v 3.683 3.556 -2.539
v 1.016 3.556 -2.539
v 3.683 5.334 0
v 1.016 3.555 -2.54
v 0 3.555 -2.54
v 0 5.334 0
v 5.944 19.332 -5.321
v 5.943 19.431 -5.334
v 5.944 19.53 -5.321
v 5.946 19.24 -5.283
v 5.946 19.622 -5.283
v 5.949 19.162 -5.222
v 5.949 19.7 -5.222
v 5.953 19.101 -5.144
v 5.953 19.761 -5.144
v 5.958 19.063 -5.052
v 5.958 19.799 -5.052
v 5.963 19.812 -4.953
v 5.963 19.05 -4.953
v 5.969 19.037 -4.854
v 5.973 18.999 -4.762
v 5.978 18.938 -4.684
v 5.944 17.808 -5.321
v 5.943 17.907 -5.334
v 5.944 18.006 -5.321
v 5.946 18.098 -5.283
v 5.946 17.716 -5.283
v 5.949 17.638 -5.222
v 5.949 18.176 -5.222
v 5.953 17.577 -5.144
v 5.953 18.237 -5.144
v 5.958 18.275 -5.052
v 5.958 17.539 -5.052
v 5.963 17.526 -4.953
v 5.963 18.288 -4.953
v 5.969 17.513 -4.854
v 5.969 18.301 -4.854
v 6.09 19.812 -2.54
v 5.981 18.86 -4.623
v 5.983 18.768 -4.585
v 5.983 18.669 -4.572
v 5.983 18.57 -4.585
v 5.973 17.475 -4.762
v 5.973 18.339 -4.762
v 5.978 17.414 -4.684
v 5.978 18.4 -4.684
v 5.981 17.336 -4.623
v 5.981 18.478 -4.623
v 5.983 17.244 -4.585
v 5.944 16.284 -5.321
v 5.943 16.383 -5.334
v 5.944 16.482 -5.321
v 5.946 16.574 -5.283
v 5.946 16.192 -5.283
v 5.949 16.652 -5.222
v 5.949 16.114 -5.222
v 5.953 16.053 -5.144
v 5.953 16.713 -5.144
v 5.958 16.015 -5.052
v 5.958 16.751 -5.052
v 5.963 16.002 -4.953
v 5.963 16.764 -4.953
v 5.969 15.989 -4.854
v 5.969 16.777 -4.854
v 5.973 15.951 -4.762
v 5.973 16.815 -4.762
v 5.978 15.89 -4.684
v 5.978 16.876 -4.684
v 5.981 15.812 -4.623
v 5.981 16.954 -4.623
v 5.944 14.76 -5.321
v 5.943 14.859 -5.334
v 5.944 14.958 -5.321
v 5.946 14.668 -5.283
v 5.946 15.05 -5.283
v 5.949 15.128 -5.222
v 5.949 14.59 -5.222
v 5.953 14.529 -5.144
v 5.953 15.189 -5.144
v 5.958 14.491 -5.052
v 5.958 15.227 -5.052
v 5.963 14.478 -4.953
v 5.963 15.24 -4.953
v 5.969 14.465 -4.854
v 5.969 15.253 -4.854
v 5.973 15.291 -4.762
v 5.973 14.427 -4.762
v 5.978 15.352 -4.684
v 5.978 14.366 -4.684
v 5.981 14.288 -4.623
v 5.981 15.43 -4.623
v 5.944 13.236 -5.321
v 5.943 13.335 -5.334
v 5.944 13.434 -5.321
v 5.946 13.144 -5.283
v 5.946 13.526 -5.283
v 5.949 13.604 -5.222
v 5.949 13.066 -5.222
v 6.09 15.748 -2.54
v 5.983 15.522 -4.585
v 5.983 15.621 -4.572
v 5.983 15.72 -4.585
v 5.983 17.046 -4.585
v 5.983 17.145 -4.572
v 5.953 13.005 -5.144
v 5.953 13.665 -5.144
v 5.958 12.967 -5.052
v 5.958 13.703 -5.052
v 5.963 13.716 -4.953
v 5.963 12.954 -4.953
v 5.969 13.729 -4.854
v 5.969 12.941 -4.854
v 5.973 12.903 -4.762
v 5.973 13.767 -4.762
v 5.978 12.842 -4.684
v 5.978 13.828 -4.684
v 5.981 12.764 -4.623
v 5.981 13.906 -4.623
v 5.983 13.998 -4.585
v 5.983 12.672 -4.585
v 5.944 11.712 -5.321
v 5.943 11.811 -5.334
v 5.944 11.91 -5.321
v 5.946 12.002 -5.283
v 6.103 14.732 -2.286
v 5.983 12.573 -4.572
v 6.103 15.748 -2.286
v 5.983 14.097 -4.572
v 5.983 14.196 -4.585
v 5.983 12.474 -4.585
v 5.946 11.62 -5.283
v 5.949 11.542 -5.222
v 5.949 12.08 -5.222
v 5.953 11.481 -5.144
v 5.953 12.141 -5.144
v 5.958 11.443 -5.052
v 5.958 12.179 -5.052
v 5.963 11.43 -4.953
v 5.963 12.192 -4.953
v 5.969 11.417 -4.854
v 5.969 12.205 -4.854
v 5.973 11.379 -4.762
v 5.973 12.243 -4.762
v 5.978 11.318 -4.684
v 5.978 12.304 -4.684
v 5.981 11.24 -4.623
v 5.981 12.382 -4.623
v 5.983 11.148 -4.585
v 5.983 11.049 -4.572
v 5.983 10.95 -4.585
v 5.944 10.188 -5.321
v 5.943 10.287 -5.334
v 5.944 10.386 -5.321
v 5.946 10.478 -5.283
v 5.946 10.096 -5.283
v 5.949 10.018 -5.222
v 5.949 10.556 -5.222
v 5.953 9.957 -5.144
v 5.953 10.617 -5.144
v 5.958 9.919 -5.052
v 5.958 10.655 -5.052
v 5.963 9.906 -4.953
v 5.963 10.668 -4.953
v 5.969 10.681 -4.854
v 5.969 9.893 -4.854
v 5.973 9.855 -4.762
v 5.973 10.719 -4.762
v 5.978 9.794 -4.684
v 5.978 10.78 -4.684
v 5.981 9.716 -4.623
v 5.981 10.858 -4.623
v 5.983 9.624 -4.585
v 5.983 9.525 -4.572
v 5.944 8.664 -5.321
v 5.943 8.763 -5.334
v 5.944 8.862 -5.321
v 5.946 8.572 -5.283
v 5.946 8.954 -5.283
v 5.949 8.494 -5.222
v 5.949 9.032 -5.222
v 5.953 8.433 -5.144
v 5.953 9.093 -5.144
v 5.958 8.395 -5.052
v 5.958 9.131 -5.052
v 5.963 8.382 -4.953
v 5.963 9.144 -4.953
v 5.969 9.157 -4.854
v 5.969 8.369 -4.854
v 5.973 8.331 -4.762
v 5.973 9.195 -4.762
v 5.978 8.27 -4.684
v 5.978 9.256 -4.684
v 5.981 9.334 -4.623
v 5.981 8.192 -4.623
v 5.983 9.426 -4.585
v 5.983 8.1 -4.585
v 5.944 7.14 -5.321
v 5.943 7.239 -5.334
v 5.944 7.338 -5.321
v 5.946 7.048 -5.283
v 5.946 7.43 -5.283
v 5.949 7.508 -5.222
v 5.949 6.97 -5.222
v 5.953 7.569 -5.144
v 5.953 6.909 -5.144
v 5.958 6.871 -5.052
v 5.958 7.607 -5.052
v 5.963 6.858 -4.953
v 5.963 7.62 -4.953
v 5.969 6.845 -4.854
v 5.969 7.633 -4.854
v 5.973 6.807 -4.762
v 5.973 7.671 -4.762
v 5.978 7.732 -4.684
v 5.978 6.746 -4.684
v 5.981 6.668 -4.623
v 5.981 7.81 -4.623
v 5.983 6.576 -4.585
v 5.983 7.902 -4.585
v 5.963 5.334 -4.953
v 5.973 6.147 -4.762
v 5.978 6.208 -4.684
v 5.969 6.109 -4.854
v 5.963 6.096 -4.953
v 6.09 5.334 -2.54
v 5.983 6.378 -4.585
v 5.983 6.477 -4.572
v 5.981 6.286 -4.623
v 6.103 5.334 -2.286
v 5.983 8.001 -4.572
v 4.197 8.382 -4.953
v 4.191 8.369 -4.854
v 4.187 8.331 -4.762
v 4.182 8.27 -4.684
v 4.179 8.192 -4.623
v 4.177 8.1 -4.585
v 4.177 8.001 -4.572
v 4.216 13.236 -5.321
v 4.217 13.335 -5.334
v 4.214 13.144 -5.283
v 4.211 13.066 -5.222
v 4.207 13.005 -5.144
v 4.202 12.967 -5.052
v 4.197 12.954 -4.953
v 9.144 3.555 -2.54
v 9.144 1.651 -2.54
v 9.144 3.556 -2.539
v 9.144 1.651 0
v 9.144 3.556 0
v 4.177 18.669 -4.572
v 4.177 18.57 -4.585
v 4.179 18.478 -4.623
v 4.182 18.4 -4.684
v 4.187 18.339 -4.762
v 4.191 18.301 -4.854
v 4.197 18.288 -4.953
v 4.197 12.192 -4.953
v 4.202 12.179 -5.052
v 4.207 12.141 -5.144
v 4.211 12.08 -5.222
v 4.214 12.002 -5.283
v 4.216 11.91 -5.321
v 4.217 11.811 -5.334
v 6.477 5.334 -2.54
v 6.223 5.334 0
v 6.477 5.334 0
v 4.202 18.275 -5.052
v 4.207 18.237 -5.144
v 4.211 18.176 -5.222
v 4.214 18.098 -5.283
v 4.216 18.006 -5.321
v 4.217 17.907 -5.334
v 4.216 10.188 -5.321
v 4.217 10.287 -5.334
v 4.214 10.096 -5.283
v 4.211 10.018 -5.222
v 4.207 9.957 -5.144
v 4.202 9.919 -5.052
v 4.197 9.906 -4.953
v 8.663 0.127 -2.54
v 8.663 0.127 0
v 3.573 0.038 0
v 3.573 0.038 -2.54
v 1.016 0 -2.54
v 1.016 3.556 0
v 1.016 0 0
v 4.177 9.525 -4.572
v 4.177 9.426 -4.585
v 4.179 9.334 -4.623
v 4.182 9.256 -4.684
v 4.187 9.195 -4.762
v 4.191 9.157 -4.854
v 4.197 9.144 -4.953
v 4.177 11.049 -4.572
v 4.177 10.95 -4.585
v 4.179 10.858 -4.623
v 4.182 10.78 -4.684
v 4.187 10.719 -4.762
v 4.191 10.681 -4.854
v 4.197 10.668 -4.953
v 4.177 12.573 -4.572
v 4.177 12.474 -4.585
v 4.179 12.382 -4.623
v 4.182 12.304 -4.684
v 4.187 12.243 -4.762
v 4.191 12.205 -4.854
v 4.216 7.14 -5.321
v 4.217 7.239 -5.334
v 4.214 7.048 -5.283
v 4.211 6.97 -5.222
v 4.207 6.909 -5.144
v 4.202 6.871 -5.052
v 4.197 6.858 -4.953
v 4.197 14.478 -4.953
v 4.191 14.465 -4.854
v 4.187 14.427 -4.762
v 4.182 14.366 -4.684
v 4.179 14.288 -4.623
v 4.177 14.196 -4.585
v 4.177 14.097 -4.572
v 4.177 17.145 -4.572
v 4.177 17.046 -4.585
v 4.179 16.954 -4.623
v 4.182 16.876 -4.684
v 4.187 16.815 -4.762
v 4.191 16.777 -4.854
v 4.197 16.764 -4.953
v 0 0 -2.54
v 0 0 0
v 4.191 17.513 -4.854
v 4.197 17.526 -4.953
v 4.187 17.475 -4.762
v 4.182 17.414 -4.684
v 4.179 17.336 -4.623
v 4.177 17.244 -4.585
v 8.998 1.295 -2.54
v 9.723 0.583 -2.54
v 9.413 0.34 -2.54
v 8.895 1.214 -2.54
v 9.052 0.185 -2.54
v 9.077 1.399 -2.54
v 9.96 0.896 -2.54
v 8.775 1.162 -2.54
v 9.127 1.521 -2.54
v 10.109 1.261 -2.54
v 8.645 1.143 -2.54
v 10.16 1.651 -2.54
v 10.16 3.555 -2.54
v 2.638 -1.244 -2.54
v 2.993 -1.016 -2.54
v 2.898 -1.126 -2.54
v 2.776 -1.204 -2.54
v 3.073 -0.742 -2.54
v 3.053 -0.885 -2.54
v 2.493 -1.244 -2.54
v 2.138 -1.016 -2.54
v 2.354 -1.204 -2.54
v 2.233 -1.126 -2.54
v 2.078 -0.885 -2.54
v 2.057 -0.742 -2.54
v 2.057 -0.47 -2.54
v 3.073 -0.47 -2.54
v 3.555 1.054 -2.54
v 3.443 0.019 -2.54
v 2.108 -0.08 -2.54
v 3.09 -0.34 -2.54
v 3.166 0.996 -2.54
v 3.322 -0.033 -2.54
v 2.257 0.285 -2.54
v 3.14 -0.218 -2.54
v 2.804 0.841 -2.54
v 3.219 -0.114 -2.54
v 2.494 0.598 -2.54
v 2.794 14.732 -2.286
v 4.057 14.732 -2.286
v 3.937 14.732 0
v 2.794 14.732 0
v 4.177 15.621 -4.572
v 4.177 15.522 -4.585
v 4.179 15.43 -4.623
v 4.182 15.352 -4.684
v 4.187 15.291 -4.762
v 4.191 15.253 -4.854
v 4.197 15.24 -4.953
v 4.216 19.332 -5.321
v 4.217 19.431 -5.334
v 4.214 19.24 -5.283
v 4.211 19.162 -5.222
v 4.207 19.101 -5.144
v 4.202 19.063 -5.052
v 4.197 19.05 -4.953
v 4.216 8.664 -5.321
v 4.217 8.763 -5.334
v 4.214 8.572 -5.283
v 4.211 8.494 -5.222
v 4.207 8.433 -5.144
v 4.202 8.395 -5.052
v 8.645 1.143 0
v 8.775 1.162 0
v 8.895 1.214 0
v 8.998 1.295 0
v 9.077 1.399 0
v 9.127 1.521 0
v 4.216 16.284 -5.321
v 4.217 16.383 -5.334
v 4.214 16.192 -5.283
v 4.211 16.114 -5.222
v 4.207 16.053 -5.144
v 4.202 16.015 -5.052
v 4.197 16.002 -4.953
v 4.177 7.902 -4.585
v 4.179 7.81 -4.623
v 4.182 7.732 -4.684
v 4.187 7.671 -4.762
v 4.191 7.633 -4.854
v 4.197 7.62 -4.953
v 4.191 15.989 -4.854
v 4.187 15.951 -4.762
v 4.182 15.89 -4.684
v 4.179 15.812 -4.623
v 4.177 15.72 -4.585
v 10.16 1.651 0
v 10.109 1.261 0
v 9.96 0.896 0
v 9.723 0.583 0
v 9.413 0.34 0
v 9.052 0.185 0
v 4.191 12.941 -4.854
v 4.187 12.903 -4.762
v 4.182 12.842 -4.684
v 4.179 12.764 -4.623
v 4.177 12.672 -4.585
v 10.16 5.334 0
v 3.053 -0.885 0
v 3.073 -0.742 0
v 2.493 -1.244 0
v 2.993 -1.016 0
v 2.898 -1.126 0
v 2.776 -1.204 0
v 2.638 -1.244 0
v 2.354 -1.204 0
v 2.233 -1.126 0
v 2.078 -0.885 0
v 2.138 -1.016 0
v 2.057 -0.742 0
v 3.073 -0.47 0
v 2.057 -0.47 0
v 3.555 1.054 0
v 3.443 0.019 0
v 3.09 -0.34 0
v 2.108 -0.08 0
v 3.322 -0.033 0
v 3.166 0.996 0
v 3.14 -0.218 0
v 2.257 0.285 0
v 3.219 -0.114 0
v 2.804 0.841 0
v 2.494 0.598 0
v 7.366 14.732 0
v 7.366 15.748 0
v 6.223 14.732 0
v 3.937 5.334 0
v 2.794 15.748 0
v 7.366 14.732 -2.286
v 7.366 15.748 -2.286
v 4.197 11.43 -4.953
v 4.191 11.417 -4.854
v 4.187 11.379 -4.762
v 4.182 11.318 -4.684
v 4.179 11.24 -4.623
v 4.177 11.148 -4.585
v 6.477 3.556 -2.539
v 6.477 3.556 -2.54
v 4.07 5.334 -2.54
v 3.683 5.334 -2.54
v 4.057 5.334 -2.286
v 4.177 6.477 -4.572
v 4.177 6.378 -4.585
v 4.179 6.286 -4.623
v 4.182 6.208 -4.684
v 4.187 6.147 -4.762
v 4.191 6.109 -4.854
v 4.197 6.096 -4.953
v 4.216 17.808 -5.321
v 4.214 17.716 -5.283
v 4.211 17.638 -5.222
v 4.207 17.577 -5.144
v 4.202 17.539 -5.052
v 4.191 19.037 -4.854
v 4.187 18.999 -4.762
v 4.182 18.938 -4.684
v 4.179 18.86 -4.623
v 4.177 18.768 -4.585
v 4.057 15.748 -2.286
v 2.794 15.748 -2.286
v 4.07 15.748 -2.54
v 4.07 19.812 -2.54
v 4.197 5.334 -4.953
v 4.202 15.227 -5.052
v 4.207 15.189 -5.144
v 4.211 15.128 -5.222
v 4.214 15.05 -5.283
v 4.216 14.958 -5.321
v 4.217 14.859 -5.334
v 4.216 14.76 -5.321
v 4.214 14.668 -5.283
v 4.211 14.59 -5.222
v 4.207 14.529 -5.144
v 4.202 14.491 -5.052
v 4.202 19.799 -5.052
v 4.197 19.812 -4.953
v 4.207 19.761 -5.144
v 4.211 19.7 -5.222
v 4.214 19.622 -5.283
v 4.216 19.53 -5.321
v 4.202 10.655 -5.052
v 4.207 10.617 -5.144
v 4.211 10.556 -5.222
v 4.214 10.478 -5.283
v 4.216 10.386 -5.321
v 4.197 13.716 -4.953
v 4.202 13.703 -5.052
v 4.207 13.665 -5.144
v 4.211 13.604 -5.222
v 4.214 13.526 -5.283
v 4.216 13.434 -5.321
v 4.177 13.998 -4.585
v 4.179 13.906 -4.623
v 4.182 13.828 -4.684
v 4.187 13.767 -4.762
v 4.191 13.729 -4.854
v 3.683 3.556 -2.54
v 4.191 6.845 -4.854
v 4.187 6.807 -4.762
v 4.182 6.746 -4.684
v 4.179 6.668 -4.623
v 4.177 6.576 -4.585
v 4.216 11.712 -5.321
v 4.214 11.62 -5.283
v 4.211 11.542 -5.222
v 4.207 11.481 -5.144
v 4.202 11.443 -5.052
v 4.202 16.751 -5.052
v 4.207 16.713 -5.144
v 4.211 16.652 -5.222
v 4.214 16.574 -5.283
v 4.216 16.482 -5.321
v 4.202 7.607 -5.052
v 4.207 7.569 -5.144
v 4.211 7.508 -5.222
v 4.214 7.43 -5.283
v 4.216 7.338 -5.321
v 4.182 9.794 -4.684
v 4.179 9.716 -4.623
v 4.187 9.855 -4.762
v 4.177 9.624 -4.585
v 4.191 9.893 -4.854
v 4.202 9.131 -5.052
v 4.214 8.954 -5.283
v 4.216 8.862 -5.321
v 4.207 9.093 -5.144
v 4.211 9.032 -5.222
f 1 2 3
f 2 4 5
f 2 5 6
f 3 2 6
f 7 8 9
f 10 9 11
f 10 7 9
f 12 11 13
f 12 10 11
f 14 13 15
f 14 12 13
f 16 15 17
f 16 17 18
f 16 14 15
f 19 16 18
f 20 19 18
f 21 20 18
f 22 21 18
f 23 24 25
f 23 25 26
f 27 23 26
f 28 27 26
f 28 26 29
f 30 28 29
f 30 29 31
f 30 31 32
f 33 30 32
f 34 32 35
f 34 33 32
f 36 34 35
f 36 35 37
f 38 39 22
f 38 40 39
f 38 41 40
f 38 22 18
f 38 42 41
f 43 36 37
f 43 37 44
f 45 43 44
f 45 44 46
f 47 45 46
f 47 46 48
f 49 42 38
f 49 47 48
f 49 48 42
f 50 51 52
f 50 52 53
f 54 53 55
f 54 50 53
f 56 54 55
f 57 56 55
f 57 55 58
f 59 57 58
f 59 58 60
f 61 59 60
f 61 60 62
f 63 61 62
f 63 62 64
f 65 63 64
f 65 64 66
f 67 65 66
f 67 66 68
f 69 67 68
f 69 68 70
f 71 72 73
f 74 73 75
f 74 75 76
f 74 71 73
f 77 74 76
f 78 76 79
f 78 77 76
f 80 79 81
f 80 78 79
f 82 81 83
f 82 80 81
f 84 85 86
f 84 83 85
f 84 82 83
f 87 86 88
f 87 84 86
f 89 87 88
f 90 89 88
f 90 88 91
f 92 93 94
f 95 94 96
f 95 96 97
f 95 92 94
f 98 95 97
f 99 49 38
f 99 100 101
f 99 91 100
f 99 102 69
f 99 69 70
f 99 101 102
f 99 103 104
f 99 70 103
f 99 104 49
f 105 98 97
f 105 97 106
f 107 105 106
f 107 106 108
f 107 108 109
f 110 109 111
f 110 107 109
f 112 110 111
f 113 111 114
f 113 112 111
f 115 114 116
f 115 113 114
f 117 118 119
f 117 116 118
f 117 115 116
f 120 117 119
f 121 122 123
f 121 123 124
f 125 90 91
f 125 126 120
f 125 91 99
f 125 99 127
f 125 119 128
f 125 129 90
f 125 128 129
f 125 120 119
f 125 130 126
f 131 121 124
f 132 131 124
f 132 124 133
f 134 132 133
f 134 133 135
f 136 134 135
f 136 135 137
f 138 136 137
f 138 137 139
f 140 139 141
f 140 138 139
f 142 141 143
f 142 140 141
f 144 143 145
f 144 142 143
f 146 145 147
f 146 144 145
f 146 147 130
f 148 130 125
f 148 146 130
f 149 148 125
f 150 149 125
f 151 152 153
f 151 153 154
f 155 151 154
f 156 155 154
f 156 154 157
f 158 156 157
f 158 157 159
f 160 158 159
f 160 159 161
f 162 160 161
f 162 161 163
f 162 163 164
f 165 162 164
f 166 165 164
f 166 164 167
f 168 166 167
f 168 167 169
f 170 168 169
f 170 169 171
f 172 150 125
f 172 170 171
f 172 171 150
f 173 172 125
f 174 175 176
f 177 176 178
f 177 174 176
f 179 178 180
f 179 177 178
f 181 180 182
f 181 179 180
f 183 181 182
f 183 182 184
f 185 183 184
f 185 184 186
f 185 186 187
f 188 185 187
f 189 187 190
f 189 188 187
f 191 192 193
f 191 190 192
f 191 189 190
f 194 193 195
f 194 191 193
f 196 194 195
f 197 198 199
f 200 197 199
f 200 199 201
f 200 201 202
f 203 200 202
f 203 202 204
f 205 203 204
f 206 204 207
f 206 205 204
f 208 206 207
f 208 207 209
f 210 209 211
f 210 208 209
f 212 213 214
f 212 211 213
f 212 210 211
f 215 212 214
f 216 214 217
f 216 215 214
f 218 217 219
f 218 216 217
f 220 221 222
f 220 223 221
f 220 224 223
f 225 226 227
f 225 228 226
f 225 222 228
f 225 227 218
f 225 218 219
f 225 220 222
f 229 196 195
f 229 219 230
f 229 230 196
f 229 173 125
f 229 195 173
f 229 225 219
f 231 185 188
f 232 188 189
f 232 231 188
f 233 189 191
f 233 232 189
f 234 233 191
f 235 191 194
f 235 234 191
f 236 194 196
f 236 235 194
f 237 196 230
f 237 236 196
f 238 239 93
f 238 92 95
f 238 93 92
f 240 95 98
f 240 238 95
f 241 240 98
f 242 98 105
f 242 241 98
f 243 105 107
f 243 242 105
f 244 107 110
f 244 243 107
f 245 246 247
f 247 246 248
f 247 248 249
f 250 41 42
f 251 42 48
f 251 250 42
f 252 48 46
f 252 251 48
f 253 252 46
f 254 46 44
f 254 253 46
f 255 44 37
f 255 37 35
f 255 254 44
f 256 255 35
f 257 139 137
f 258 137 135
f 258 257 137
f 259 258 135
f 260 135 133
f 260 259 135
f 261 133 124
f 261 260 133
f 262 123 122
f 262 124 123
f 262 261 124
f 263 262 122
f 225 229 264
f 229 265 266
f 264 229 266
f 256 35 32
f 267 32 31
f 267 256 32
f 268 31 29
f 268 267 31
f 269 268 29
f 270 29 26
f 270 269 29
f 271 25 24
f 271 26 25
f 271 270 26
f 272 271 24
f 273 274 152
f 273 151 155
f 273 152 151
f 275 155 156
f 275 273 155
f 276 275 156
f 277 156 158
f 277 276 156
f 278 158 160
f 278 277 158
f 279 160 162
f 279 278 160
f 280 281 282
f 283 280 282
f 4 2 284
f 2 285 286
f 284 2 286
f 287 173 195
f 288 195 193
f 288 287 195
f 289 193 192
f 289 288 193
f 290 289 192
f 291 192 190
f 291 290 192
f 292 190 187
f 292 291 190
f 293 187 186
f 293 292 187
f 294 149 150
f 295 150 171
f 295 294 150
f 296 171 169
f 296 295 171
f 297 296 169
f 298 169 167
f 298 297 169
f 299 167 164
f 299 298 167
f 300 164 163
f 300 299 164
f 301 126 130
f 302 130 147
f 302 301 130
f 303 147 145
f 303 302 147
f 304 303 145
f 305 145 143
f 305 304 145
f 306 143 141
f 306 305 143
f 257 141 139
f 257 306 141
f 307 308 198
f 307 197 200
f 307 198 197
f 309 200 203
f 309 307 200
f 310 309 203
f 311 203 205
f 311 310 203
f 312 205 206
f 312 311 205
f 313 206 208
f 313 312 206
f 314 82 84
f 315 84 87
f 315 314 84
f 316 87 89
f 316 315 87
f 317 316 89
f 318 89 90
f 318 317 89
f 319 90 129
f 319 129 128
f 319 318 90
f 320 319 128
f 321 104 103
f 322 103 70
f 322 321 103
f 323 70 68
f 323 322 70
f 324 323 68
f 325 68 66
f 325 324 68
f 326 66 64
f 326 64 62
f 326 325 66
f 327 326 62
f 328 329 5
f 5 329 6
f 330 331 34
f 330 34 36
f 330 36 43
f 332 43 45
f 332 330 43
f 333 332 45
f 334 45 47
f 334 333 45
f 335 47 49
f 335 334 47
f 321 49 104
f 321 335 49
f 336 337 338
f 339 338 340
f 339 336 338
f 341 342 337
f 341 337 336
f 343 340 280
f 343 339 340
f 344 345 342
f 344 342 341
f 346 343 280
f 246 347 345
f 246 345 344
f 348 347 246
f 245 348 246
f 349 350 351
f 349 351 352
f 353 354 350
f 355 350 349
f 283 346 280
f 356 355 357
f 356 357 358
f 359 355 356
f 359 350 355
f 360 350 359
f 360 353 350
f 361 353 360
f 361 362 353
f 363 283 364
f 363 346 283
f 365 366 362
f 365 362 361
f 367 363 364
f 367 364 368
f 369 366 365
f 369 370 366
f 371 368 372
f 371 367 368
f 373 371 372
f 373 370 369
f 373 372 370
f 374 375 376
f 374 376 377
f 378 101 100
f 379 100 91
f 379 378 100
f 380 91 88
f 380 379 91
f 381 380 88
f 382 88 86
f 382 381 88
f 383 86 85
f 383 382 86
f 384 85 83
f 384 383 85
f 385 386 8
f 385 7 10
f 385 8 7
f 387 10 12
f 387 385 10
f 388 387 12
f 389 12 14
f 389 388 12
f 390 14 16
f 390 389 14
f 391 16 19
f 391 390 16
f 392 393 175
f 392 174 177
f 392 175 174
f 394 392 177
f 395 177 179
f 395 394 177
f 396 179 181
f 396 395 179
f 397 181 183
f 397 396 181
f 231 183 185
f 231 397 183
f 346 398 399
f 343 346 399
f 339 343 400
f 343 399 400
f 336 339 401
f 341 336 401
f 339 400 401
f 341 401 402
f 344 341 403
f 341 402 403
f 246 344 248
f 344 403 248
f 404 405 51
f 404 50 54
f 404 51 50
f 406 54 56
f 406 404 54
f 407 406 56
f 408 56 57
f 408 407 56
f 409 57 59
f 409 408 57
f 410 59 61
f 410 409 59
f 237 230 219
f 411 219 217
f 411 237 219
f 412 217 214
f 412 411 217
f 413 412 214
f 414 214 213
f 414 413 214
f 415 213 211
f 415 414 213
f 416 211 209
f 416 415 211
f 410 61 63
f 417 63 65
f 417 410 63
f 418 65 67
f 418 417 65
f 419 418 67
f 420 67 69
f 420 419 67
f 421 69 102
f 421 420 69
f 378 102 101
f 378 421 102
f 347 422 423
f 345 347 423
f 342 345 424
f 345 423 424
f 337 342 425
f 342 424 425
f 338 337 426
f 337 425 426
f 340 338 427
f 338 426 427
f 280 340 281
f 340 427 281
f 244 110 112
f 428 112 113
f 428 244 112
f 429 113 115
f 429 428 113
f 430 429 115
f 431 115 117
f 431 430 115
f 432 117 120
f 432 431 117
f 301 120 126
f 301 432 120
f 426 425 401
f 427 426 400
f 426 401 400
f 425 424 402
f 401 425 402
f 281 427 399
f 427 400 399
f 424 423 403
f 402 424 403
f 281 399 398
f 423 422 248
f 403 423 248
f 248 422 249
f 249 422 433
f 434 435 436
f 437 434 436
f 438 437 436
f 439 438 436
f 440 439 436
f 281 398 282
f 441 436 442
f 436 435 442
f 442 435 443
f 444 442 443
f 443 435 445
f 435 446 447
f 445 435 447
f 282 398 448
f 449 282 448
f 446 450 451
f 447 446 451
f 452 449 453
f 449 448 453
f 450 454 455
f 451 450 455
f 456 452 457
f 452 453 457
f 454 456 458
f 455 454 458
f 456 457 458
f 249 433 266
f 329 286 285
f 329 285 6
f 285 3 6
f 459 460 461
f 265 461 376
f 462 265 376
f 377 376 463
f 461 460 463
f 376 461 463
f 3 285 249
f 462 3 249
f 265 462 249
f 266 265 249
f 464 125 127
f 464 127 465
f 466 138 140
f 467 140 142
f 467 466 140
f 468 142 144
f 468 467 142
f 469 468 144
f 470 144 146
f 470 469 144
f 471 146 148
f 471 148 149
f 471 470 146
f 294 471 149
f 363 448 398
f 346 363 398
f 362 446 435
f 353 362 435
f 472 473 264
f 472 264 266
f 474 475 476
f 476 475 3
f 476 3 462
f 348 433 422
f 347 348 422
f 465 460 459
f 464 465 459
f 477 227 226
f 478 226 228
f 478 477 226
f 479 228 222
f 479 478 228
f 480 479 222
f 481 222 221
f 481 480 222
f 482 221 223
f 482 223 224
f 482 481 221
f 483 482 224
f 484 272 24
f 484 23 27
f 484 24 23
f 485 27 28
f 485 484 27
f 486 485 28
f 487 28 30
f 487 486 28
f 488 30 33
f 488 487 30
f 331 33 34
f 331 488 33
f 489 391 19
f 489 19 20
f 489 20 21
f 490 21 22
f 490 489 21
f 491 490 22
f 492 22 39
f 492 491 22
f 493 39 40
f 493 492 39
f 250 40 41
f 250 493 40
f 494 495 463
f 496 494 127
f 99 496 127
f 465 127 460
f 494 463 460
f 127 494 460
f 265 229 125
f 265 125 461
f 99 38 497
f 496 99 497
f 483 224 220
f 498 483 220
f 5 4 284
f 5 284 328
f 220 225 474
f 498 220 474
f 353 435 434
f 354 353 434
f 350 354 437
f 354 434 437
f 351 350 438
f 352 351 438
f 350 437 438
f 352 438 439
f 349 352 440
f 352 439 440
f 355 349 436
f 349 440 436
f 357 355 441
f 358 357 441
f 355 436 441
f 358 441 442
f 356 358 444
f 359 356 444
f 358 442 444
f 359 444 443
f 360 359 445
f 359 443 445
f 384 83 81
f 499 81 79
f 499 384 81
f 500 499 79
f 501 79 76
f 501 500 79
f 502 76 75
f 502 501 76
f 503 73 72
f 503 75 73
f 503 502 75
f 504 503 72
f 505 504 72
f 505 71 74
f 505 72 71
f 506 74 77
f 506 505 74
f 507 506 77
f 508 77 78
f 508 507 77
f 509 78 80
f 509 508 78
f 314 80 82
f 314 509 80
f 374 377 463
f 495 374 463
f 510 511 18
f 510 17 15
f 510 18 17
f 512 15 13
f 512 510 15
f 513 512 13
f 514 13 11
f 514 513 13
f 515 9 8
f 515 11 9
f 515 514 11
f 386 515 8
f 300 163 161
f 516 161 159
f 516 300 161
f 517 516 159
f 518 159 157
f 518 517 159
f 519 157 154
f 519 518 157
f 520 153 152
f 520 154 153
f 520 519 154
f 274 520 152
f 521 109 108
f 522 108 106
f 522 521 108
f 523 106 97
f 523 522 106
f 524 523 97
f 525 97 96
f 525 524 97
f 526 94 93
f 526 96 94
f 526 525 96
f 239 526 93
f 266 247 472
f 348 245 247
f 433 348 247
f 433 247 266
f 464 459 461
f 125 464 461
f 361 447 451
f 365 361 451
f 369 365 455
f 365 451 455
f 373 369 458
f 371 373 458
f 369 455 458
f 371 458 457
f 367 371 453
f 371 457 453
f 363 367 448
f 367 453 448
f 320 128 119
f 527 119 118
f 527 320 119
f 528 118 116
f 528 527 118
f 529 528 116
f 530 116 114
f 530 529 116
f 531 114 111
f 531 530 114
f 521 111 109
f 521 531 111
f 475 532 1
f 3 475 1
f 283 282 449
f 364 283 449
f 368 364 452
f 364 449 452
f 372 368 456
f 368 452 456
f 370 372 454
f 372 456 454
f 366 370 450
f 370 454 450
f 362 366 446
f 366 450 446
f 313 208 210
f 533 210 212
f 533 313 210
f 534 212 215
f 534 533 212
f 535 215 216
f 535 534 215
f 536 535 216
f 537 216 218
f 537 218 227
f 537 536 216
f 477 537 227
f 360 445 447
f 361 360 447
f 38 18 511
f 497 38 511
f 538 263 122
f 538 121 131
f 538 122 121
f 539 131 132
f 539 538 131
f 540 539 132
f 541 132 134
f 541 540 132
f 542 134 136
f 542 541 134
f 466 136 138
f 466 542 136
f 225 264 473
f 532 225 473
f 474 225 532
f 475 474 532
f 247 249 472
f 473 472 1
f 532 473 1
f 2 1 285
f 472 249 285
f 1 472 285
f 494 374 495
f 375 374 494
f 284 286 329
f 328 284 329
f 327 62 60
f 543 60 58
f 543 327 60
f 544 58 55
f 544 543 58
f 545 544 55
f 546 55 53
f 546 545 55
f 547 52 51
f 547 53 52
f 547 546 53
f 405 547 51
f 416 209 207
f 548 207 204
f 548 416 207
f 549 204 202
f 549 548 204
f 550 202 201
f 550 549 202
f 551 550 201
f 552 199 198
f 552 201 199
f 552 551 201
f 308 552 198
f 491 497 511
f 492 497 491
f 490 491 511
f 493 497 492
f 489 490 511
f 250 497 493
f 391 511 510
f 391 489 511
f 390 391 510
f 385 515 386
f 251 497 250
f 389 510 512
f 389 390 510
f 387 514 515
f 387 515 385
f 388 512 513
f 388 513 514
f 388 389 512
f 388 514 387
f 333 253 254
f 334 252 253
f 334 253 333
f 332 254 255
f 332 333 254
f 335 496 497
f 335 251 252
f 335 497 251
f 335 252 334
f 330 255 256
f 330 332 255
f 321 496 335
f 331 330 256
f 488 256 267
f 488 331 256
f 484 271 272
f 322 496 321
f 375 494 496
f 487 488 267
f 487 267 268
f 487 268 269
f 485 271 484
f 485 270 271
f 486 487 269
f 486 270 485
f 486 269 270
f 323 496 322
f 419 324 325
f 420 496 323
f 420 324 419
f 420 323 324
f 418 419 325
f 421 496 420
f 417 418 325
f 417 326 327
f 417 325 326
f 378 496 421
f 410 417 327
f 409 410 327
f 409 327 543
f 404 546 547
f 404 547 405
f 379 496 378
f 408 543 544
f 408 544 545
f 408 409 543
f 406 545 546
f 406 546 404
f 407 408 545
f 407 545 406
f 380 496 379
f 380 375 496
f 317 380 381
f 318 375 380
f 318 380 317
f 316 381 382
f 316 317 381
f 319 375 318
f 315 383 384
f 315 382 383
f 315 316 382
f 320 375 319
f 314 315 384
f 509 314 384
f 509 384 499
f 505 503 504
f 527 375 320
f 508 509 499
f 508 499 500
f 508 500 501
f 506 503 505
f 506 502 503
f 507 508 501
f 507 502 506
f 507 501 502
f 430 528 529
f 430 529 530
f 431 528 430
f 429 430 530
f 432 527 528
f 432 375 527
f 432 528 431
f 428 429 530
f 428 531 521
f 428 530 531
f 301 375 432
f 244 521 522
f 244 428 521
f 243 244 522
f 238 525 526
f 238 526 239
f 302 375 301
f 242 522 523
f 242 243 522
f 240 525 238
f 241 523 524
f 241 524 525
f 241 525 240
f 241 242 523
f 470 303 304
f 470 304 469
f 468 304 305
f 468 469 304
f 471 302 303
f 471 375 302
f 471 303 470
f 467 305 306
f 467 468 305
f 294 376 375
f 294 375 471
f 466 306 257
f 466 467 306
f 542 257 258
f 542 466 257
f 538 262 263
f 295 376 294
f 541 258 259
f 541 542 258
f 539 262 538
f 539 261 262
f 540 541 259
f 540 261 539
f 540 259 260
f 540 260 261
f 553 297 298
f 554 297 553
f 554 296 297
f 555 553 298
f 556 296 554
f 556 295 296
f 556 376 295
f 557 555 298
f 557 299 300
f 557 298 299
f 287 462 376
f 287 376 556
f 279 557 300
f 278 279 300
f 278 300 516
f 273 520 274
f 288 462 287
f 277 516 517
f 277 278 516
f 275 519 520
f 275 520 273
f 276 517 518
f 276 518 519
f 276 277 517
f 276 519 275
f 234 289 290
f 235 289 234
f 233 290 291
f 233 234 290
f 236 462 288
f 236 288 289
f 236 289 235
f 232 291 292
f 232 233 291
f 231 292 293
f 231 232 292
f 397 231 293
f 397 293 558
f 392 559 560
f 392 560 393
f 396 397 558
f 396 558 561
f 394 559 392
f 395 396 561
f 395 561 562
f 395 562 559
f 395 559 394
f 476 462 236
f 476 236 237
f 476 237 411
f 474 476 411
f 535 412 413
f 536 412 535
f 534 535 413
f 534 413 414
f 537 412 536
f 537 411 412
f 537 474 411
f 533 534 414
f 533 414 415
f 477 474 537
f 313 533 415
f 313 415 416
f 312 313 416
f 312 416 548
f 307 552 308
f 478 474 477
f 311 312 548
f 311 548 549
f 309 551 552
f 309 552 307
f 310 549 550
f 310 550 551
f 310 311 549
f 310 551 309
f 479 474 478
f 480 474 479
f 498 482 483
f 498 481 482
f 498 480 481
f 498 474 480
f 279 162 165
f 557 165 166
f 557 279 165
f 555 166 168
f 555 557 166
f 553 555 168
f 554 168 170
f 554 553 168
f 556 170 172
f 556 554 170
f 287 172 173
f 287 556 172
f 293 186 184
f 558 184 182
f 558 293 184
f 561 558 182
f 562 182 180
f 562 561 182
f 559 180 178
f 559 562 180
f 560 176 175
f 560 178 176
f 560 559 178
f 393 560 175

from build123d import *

# Parameters (mm, degrees)
BOSS_EXTRUDE1_DEPTH = 2.54
CUT_EXTRUDE2_DEPTH  = 3.683
CUT_EXTRUDE4_START  = 10.16
CUT_EXTRUDE4_DEPTH  = 3.683
SKETCH2_W           = 2.286
SKETCH2_H           = 14.478
BOSS_EXTRUDE2_DEPTH = 2.794
SKETCH3_W           = 1.143
SKETCH3_H           = 1.016
CUT_EXTRUDE5_DEPTH  = 0.254
DRAFT2_START        = 5.334
DRAFT2_DEPTH        = 14.478
DRAFT2_2_DEPTH      = 9.398
CUT_EXTRUDE6_DEPTH  = 23.895250599


# Read off the part's stored shape, not the designer's step: Draft2
with BuildPart() as part:
    # Model → Boss-Extrude1 (new body)
    with BuildSketch(Plane.XY):
        with BuildLine():
            Line((2.794, 15.748), (7.366, 15.748))
            Line((7.366, 15.748), (7.366, 14.732))
            Line((7.366, 14.732), (6.223, 14.732))
            Line((6.223, 14.732), (6.223, 5.334))
            Line((6.223, 5.334), (10.16, 5.334))
            Line((10.16, 5.334), (10.16, 1.650767887))
            ThreePointArc((10.16, 1.650767887), (9.722993685, 0.582582169), (8.662597467, 0.127))
            Line((8.662597467, 0.127), (3.572534178, 0.038152615))
            ThreePointArc((3.572534178, 0.038152615), (3.219068772, -0.113708108), (3.0734, -0.469770014))
            Line((3.0734, -0.469770014), (3.0734, -0.741620434))
            ThreePointArc((3.0734, -0.741620434), (2.5654, -1.249620434), (2.0574, -0.741620434))
            Line((2.0574, -0.741620434), (2.0574, -0.469770014))
            ThreePointArc((2.0574, -0.469770014), (2.494406315, 0.598415704), (3.554802533, 1.053997873))
            Line((3.554802533, 1.053997873), (8.644865822, 1.142845258))
            ThreePointArc((8.644865822, 1.142845258), (8.998331228, 1.294705981), (9.144, 1.650767887))
            Line((9.144, 1.650767887), (9.144, 3.556))
            Line((9.144, 3.556), (1.016, 3.556))
            Line((1.016, 3.556), (1.016, 0))
            Line((1.016, 0), (0, 0))
            Line((0, 0), (0, 5.334))
            Line((0, 5.334), (3.937, 5.334))
            Line((3.937, 5.334), (3.937, 14.732))
            Line((3.937, 14.732), (2.794, 14.732))
            Line((2.794, 14.732), (2.794, 15.748))
        make_face()
    extrude(amount=-BOSS_EXTRUDE1_DEPTH)

    # Sketch1 → Cut-Extrude2 (cut)
    with BuildSketch(Plane(origin=(0, 0, 0), x_dir=(0, 0, -1), z_dir=(1, 0, 0))):
        Polygon((0, 5.334), (2.54, 5.334), (2.54, 3.555472853), align=None)
    extrude(amount=CUT_EXTRUDE2_DEPTH, mode=Mode.SUBTRACT)

    # Sketch1<3> → Cut-Extrude4 (cut)
    with BuildSketch(Plane(origin=(0, 0, 0), x_dir=(0, 0, -1), z_dir=(1, 0, 0)).offset(CUT_EXTRUDE4_START)):
        Polygon((0, 5.334), (2.54, 5.334), (2.54, 3.555472853), align=None)
    extrude(amount=-CUT_EXTRUDE4_DEPTH, mode=Mode.SUBTRACT)

    # Sketch2 → Boss-Extrude2 (add)
    with BuildSketch(Plane(origin=(0, 0, -2.54), x_dir=(-1, 0, 0), z_dir=(0, 0, -1))):
        with Locations((-5.08, 12.573)):
            Rectangle(SKETCH2_W, SKETCH2_H)
    extrude(amount=BOSS_EXTRUDE2_DEPTH)

    # Sketch3 → Cut-Extrude5 (cut)
    with BuildSketch(Plane(origin=(0, 0, -2.54), x_dir=(-1, 0, 0), z_dir=(0, 0, -1))):
        with Locations((-6.7945, 15.24)):
            Rectangle(SKETCH3_W, SKETCH3_H)
        with Locations((-3.3655, 15.24)):
            Rectangle(SKETCH3_W, SKETCH3_H)
    extrude(amount=-CUT_EXTRUDE5_DEPTH, mode=Mode.SUBTRACT)

    # Draft2 outline → Draft2 (cut)
    with BuildSketch(Plane(origin=(0, 0, 0), x_dir=(1, 0, 0), z_dir=(0, 1, 0)).offset(DRAFT2_START)):
        Polygon((4.216543095, 5.334), (3.937, 5.334), (3.937, 2.286), (4.056804183, 2.286), align=None)
        Polygon((6.223, 5.334), (5.943456905, 5.334), (6.103195817, 2.286), (6.223, 2.286), align=None)
    extrude(amount=DRAFT2_DEPTH, mode=Mode.SUBTRACT)

    # Draft2 2 outline → Draft2 2 (cut)
    with BuildSketch(Plane(origin=(0, 0, 0), x_dir=(1, 0, 0), z_dir=(0, 1, 0)).offset(DRAFT2_START)):
        Polygon((3.937, 0), (4.056804184, 2.286), (3.937, 2.286), align=None)
        Polygon((6.223, 2.286), (6.103195817, 2.286), (6.223, 0), align=None)
    extrude(amount=DRAFT2_2_DEPTH, mode=Mode.SUBTRACT)

    # Sketch4 → Cut-Extrude6 (cut, through all)
    with BuildSketch(Plane(origin=(0, 0, 0), x_dir=(0, 0, -1), z_dir=(1, 0, 0))):
        with BuildLine():
            ThreePointArc((4.953, 19.812), (5.222407684, 19.700407684), (5.334, 19.431))
            Line((5.334, 19.431), (5.334, 19.812))
            Line((5.334, 19.812), (4.953, 19.812))
        make_face()
        with BuildLine():
            ThreePointArc((4.953, 18.288), (5.222407684, 18.176407684), (5.334, 17.907))
            Line((5.334, 17.907), (5.334, 19.431))
            ThreePointArc((5.334, 19.431), (5.222407684, 19.161592316), (4.953, 19.05))
            ThreePointArc((4.953, 19.05), (4.683592316, 18.938407684), (4.572, 18.669))
            ThreePointArc((4.572, 18.669), (4.683592316, 18.399592316), (4.953, 18.288))
        make_face()
        with BuildLine():
            ThreePointArc((4.953, 16.764), (5.222407684, 16.652407684), (5.334, 16.383))
            Line((5.334, 16.383), (5.334, 17.907))
            ThreePointArc((5.334, 17.907), (5.222407684, 17.637592316), (4.953, 17.526))
            ThreePointArc((4.953, 17.526), (4.683592316, 17.414407684), (4.572, 17.145))
            ThreePointArc((4.572, 17.145), (4.683592316, 16.875592316), (4.953, 16.764))
        make_face()
        with BuildLine():
            ThreePointArc((4.953, 15.24), (5.222407684, 15.128407684), (5.334, 14.859))
            Line((5.334, 14.859), (5.334, 16.383))
            ThreePointArc((5.334, 16.383), (5.222407684, 16.113592316), (4.953, 16.002))
            ThreePointArc((4.953, 16.002), (4.683592316, 15.890407684), (4.572, 15.621))
            ThreePointArc((4.572, 15.621), (4.683592316, 15.351592316), (4.953, 15.24))
        make_face()
        with BuildLine():
            ThreePointArc((4.953, 13.716), (5.222407684, 13.604407684), (5.334, 13.335))
            Line((5.334, 13.335), (5.334, 14.859))
            ThreePointArc((5.334, 14.859), (5.222407684, 14.589592316), (4.953, 14.478))
            ThreePointArc((4.953, 14.478), (4.683592316, 14.366407684), (4.572, 14.097))
            ThreePointArc((4.572, 14.097), (4.683592316, 13.827592316), (4.953, 13.716))
        make_face()
        with BuildLine():
            ThreePointArc((4.953, 12.192), (5.222407684, 12.080407684), (5.334, 11.811))
            Line((5.334, 11.811), (5.334, 13.335))
            ThreePointArc((5.334, 13.335), (5.222407684, 13.065592316), (4.953, 12.954))
            ThreePointArc((4.953, 12.954), (4.683592316, 12.842407684), (4.572, 12.573))
            ThreePointArc((4.572, 12.573), (4.683592316, 12.303592316), (4.953, 12.192))
        make_face()
        with BuildLine():
            ThreePointArc((4.953, 10.668), (5.222407684, 10.556407684), (5.334, 10.287))
            Line((5.334, 10.287), (5.334, 11.811))
            ThreePointArc((5.334, 11.811), (5.222407684, 11.541592316), (4.953, 11.43))
            ThreePointArc((4.953, 11.43), (4.683592316, 11.318407684), (4.572, 11.049))
            ThreePointArc((4.572, 11.049), (4.683592316, 10.779592316), (4.953, 10.668))
        make_face()
        with BuildLine():
            ThreePointArc((4.953, 9.144), (5.222407684, 9.032407684), (5.334, 8.763))
            Line((5.334, 8.763), (5.334, 10.287))
            ThreePointArc((5.334, 10.287), (5.222407684, 10.017592316), (4.953, 9.906))
            ThreePointArc((4.953, 9.906), (4.683592316, 9.794407684), (4.572, 9.525))
            ThreePointArc((4.572, 9.525), (4.683592316, 9.255592316), (4.953, 9.144))
        make_face()
        with BuildLine():
            ThreePointArc((4.953, 7.62), (5.222407684, 7.508407684), (5.334, 7.239))
            Line((5.334, 7.239), (5.334, 8.763))
            ThreePointArc((5.334, 8.763), (5.222407684, 8.493592316), (4.953, 8.382))
            ThreePointArc((4.953, 8.382), (4.683592316, 8.270407684), (4.572, 8.001))
            ThreePointArc((4.572, 8.001), (4.683592316, 7.731592316), (4.953, 7.62))
        make_face()
        with BuildLine():
            ThreePointArc((4.572, 6.477), (4.683592316, 6.207592316), (4.953, 6.096))
            Line((4.953, 6.096), (4.953, 3.556))
            Line((4.953, 3.556), (5.334, 3.556))
            Line((5.334, 3.556), (5.334, 7.239))
            ThreePointArc((5.334, 7.239), (5.222407684, 6.969592316), (4.953, 6.858))
            ThreePointArc((4.953, 6.858), (4.683592316, 6.746407684), (4.572, 6.477))
        make_face()
    extrude(amount=CUT_EXTRUDE6_DEPTH, mode=Mode.SUBTRACT)


solid = part.part
